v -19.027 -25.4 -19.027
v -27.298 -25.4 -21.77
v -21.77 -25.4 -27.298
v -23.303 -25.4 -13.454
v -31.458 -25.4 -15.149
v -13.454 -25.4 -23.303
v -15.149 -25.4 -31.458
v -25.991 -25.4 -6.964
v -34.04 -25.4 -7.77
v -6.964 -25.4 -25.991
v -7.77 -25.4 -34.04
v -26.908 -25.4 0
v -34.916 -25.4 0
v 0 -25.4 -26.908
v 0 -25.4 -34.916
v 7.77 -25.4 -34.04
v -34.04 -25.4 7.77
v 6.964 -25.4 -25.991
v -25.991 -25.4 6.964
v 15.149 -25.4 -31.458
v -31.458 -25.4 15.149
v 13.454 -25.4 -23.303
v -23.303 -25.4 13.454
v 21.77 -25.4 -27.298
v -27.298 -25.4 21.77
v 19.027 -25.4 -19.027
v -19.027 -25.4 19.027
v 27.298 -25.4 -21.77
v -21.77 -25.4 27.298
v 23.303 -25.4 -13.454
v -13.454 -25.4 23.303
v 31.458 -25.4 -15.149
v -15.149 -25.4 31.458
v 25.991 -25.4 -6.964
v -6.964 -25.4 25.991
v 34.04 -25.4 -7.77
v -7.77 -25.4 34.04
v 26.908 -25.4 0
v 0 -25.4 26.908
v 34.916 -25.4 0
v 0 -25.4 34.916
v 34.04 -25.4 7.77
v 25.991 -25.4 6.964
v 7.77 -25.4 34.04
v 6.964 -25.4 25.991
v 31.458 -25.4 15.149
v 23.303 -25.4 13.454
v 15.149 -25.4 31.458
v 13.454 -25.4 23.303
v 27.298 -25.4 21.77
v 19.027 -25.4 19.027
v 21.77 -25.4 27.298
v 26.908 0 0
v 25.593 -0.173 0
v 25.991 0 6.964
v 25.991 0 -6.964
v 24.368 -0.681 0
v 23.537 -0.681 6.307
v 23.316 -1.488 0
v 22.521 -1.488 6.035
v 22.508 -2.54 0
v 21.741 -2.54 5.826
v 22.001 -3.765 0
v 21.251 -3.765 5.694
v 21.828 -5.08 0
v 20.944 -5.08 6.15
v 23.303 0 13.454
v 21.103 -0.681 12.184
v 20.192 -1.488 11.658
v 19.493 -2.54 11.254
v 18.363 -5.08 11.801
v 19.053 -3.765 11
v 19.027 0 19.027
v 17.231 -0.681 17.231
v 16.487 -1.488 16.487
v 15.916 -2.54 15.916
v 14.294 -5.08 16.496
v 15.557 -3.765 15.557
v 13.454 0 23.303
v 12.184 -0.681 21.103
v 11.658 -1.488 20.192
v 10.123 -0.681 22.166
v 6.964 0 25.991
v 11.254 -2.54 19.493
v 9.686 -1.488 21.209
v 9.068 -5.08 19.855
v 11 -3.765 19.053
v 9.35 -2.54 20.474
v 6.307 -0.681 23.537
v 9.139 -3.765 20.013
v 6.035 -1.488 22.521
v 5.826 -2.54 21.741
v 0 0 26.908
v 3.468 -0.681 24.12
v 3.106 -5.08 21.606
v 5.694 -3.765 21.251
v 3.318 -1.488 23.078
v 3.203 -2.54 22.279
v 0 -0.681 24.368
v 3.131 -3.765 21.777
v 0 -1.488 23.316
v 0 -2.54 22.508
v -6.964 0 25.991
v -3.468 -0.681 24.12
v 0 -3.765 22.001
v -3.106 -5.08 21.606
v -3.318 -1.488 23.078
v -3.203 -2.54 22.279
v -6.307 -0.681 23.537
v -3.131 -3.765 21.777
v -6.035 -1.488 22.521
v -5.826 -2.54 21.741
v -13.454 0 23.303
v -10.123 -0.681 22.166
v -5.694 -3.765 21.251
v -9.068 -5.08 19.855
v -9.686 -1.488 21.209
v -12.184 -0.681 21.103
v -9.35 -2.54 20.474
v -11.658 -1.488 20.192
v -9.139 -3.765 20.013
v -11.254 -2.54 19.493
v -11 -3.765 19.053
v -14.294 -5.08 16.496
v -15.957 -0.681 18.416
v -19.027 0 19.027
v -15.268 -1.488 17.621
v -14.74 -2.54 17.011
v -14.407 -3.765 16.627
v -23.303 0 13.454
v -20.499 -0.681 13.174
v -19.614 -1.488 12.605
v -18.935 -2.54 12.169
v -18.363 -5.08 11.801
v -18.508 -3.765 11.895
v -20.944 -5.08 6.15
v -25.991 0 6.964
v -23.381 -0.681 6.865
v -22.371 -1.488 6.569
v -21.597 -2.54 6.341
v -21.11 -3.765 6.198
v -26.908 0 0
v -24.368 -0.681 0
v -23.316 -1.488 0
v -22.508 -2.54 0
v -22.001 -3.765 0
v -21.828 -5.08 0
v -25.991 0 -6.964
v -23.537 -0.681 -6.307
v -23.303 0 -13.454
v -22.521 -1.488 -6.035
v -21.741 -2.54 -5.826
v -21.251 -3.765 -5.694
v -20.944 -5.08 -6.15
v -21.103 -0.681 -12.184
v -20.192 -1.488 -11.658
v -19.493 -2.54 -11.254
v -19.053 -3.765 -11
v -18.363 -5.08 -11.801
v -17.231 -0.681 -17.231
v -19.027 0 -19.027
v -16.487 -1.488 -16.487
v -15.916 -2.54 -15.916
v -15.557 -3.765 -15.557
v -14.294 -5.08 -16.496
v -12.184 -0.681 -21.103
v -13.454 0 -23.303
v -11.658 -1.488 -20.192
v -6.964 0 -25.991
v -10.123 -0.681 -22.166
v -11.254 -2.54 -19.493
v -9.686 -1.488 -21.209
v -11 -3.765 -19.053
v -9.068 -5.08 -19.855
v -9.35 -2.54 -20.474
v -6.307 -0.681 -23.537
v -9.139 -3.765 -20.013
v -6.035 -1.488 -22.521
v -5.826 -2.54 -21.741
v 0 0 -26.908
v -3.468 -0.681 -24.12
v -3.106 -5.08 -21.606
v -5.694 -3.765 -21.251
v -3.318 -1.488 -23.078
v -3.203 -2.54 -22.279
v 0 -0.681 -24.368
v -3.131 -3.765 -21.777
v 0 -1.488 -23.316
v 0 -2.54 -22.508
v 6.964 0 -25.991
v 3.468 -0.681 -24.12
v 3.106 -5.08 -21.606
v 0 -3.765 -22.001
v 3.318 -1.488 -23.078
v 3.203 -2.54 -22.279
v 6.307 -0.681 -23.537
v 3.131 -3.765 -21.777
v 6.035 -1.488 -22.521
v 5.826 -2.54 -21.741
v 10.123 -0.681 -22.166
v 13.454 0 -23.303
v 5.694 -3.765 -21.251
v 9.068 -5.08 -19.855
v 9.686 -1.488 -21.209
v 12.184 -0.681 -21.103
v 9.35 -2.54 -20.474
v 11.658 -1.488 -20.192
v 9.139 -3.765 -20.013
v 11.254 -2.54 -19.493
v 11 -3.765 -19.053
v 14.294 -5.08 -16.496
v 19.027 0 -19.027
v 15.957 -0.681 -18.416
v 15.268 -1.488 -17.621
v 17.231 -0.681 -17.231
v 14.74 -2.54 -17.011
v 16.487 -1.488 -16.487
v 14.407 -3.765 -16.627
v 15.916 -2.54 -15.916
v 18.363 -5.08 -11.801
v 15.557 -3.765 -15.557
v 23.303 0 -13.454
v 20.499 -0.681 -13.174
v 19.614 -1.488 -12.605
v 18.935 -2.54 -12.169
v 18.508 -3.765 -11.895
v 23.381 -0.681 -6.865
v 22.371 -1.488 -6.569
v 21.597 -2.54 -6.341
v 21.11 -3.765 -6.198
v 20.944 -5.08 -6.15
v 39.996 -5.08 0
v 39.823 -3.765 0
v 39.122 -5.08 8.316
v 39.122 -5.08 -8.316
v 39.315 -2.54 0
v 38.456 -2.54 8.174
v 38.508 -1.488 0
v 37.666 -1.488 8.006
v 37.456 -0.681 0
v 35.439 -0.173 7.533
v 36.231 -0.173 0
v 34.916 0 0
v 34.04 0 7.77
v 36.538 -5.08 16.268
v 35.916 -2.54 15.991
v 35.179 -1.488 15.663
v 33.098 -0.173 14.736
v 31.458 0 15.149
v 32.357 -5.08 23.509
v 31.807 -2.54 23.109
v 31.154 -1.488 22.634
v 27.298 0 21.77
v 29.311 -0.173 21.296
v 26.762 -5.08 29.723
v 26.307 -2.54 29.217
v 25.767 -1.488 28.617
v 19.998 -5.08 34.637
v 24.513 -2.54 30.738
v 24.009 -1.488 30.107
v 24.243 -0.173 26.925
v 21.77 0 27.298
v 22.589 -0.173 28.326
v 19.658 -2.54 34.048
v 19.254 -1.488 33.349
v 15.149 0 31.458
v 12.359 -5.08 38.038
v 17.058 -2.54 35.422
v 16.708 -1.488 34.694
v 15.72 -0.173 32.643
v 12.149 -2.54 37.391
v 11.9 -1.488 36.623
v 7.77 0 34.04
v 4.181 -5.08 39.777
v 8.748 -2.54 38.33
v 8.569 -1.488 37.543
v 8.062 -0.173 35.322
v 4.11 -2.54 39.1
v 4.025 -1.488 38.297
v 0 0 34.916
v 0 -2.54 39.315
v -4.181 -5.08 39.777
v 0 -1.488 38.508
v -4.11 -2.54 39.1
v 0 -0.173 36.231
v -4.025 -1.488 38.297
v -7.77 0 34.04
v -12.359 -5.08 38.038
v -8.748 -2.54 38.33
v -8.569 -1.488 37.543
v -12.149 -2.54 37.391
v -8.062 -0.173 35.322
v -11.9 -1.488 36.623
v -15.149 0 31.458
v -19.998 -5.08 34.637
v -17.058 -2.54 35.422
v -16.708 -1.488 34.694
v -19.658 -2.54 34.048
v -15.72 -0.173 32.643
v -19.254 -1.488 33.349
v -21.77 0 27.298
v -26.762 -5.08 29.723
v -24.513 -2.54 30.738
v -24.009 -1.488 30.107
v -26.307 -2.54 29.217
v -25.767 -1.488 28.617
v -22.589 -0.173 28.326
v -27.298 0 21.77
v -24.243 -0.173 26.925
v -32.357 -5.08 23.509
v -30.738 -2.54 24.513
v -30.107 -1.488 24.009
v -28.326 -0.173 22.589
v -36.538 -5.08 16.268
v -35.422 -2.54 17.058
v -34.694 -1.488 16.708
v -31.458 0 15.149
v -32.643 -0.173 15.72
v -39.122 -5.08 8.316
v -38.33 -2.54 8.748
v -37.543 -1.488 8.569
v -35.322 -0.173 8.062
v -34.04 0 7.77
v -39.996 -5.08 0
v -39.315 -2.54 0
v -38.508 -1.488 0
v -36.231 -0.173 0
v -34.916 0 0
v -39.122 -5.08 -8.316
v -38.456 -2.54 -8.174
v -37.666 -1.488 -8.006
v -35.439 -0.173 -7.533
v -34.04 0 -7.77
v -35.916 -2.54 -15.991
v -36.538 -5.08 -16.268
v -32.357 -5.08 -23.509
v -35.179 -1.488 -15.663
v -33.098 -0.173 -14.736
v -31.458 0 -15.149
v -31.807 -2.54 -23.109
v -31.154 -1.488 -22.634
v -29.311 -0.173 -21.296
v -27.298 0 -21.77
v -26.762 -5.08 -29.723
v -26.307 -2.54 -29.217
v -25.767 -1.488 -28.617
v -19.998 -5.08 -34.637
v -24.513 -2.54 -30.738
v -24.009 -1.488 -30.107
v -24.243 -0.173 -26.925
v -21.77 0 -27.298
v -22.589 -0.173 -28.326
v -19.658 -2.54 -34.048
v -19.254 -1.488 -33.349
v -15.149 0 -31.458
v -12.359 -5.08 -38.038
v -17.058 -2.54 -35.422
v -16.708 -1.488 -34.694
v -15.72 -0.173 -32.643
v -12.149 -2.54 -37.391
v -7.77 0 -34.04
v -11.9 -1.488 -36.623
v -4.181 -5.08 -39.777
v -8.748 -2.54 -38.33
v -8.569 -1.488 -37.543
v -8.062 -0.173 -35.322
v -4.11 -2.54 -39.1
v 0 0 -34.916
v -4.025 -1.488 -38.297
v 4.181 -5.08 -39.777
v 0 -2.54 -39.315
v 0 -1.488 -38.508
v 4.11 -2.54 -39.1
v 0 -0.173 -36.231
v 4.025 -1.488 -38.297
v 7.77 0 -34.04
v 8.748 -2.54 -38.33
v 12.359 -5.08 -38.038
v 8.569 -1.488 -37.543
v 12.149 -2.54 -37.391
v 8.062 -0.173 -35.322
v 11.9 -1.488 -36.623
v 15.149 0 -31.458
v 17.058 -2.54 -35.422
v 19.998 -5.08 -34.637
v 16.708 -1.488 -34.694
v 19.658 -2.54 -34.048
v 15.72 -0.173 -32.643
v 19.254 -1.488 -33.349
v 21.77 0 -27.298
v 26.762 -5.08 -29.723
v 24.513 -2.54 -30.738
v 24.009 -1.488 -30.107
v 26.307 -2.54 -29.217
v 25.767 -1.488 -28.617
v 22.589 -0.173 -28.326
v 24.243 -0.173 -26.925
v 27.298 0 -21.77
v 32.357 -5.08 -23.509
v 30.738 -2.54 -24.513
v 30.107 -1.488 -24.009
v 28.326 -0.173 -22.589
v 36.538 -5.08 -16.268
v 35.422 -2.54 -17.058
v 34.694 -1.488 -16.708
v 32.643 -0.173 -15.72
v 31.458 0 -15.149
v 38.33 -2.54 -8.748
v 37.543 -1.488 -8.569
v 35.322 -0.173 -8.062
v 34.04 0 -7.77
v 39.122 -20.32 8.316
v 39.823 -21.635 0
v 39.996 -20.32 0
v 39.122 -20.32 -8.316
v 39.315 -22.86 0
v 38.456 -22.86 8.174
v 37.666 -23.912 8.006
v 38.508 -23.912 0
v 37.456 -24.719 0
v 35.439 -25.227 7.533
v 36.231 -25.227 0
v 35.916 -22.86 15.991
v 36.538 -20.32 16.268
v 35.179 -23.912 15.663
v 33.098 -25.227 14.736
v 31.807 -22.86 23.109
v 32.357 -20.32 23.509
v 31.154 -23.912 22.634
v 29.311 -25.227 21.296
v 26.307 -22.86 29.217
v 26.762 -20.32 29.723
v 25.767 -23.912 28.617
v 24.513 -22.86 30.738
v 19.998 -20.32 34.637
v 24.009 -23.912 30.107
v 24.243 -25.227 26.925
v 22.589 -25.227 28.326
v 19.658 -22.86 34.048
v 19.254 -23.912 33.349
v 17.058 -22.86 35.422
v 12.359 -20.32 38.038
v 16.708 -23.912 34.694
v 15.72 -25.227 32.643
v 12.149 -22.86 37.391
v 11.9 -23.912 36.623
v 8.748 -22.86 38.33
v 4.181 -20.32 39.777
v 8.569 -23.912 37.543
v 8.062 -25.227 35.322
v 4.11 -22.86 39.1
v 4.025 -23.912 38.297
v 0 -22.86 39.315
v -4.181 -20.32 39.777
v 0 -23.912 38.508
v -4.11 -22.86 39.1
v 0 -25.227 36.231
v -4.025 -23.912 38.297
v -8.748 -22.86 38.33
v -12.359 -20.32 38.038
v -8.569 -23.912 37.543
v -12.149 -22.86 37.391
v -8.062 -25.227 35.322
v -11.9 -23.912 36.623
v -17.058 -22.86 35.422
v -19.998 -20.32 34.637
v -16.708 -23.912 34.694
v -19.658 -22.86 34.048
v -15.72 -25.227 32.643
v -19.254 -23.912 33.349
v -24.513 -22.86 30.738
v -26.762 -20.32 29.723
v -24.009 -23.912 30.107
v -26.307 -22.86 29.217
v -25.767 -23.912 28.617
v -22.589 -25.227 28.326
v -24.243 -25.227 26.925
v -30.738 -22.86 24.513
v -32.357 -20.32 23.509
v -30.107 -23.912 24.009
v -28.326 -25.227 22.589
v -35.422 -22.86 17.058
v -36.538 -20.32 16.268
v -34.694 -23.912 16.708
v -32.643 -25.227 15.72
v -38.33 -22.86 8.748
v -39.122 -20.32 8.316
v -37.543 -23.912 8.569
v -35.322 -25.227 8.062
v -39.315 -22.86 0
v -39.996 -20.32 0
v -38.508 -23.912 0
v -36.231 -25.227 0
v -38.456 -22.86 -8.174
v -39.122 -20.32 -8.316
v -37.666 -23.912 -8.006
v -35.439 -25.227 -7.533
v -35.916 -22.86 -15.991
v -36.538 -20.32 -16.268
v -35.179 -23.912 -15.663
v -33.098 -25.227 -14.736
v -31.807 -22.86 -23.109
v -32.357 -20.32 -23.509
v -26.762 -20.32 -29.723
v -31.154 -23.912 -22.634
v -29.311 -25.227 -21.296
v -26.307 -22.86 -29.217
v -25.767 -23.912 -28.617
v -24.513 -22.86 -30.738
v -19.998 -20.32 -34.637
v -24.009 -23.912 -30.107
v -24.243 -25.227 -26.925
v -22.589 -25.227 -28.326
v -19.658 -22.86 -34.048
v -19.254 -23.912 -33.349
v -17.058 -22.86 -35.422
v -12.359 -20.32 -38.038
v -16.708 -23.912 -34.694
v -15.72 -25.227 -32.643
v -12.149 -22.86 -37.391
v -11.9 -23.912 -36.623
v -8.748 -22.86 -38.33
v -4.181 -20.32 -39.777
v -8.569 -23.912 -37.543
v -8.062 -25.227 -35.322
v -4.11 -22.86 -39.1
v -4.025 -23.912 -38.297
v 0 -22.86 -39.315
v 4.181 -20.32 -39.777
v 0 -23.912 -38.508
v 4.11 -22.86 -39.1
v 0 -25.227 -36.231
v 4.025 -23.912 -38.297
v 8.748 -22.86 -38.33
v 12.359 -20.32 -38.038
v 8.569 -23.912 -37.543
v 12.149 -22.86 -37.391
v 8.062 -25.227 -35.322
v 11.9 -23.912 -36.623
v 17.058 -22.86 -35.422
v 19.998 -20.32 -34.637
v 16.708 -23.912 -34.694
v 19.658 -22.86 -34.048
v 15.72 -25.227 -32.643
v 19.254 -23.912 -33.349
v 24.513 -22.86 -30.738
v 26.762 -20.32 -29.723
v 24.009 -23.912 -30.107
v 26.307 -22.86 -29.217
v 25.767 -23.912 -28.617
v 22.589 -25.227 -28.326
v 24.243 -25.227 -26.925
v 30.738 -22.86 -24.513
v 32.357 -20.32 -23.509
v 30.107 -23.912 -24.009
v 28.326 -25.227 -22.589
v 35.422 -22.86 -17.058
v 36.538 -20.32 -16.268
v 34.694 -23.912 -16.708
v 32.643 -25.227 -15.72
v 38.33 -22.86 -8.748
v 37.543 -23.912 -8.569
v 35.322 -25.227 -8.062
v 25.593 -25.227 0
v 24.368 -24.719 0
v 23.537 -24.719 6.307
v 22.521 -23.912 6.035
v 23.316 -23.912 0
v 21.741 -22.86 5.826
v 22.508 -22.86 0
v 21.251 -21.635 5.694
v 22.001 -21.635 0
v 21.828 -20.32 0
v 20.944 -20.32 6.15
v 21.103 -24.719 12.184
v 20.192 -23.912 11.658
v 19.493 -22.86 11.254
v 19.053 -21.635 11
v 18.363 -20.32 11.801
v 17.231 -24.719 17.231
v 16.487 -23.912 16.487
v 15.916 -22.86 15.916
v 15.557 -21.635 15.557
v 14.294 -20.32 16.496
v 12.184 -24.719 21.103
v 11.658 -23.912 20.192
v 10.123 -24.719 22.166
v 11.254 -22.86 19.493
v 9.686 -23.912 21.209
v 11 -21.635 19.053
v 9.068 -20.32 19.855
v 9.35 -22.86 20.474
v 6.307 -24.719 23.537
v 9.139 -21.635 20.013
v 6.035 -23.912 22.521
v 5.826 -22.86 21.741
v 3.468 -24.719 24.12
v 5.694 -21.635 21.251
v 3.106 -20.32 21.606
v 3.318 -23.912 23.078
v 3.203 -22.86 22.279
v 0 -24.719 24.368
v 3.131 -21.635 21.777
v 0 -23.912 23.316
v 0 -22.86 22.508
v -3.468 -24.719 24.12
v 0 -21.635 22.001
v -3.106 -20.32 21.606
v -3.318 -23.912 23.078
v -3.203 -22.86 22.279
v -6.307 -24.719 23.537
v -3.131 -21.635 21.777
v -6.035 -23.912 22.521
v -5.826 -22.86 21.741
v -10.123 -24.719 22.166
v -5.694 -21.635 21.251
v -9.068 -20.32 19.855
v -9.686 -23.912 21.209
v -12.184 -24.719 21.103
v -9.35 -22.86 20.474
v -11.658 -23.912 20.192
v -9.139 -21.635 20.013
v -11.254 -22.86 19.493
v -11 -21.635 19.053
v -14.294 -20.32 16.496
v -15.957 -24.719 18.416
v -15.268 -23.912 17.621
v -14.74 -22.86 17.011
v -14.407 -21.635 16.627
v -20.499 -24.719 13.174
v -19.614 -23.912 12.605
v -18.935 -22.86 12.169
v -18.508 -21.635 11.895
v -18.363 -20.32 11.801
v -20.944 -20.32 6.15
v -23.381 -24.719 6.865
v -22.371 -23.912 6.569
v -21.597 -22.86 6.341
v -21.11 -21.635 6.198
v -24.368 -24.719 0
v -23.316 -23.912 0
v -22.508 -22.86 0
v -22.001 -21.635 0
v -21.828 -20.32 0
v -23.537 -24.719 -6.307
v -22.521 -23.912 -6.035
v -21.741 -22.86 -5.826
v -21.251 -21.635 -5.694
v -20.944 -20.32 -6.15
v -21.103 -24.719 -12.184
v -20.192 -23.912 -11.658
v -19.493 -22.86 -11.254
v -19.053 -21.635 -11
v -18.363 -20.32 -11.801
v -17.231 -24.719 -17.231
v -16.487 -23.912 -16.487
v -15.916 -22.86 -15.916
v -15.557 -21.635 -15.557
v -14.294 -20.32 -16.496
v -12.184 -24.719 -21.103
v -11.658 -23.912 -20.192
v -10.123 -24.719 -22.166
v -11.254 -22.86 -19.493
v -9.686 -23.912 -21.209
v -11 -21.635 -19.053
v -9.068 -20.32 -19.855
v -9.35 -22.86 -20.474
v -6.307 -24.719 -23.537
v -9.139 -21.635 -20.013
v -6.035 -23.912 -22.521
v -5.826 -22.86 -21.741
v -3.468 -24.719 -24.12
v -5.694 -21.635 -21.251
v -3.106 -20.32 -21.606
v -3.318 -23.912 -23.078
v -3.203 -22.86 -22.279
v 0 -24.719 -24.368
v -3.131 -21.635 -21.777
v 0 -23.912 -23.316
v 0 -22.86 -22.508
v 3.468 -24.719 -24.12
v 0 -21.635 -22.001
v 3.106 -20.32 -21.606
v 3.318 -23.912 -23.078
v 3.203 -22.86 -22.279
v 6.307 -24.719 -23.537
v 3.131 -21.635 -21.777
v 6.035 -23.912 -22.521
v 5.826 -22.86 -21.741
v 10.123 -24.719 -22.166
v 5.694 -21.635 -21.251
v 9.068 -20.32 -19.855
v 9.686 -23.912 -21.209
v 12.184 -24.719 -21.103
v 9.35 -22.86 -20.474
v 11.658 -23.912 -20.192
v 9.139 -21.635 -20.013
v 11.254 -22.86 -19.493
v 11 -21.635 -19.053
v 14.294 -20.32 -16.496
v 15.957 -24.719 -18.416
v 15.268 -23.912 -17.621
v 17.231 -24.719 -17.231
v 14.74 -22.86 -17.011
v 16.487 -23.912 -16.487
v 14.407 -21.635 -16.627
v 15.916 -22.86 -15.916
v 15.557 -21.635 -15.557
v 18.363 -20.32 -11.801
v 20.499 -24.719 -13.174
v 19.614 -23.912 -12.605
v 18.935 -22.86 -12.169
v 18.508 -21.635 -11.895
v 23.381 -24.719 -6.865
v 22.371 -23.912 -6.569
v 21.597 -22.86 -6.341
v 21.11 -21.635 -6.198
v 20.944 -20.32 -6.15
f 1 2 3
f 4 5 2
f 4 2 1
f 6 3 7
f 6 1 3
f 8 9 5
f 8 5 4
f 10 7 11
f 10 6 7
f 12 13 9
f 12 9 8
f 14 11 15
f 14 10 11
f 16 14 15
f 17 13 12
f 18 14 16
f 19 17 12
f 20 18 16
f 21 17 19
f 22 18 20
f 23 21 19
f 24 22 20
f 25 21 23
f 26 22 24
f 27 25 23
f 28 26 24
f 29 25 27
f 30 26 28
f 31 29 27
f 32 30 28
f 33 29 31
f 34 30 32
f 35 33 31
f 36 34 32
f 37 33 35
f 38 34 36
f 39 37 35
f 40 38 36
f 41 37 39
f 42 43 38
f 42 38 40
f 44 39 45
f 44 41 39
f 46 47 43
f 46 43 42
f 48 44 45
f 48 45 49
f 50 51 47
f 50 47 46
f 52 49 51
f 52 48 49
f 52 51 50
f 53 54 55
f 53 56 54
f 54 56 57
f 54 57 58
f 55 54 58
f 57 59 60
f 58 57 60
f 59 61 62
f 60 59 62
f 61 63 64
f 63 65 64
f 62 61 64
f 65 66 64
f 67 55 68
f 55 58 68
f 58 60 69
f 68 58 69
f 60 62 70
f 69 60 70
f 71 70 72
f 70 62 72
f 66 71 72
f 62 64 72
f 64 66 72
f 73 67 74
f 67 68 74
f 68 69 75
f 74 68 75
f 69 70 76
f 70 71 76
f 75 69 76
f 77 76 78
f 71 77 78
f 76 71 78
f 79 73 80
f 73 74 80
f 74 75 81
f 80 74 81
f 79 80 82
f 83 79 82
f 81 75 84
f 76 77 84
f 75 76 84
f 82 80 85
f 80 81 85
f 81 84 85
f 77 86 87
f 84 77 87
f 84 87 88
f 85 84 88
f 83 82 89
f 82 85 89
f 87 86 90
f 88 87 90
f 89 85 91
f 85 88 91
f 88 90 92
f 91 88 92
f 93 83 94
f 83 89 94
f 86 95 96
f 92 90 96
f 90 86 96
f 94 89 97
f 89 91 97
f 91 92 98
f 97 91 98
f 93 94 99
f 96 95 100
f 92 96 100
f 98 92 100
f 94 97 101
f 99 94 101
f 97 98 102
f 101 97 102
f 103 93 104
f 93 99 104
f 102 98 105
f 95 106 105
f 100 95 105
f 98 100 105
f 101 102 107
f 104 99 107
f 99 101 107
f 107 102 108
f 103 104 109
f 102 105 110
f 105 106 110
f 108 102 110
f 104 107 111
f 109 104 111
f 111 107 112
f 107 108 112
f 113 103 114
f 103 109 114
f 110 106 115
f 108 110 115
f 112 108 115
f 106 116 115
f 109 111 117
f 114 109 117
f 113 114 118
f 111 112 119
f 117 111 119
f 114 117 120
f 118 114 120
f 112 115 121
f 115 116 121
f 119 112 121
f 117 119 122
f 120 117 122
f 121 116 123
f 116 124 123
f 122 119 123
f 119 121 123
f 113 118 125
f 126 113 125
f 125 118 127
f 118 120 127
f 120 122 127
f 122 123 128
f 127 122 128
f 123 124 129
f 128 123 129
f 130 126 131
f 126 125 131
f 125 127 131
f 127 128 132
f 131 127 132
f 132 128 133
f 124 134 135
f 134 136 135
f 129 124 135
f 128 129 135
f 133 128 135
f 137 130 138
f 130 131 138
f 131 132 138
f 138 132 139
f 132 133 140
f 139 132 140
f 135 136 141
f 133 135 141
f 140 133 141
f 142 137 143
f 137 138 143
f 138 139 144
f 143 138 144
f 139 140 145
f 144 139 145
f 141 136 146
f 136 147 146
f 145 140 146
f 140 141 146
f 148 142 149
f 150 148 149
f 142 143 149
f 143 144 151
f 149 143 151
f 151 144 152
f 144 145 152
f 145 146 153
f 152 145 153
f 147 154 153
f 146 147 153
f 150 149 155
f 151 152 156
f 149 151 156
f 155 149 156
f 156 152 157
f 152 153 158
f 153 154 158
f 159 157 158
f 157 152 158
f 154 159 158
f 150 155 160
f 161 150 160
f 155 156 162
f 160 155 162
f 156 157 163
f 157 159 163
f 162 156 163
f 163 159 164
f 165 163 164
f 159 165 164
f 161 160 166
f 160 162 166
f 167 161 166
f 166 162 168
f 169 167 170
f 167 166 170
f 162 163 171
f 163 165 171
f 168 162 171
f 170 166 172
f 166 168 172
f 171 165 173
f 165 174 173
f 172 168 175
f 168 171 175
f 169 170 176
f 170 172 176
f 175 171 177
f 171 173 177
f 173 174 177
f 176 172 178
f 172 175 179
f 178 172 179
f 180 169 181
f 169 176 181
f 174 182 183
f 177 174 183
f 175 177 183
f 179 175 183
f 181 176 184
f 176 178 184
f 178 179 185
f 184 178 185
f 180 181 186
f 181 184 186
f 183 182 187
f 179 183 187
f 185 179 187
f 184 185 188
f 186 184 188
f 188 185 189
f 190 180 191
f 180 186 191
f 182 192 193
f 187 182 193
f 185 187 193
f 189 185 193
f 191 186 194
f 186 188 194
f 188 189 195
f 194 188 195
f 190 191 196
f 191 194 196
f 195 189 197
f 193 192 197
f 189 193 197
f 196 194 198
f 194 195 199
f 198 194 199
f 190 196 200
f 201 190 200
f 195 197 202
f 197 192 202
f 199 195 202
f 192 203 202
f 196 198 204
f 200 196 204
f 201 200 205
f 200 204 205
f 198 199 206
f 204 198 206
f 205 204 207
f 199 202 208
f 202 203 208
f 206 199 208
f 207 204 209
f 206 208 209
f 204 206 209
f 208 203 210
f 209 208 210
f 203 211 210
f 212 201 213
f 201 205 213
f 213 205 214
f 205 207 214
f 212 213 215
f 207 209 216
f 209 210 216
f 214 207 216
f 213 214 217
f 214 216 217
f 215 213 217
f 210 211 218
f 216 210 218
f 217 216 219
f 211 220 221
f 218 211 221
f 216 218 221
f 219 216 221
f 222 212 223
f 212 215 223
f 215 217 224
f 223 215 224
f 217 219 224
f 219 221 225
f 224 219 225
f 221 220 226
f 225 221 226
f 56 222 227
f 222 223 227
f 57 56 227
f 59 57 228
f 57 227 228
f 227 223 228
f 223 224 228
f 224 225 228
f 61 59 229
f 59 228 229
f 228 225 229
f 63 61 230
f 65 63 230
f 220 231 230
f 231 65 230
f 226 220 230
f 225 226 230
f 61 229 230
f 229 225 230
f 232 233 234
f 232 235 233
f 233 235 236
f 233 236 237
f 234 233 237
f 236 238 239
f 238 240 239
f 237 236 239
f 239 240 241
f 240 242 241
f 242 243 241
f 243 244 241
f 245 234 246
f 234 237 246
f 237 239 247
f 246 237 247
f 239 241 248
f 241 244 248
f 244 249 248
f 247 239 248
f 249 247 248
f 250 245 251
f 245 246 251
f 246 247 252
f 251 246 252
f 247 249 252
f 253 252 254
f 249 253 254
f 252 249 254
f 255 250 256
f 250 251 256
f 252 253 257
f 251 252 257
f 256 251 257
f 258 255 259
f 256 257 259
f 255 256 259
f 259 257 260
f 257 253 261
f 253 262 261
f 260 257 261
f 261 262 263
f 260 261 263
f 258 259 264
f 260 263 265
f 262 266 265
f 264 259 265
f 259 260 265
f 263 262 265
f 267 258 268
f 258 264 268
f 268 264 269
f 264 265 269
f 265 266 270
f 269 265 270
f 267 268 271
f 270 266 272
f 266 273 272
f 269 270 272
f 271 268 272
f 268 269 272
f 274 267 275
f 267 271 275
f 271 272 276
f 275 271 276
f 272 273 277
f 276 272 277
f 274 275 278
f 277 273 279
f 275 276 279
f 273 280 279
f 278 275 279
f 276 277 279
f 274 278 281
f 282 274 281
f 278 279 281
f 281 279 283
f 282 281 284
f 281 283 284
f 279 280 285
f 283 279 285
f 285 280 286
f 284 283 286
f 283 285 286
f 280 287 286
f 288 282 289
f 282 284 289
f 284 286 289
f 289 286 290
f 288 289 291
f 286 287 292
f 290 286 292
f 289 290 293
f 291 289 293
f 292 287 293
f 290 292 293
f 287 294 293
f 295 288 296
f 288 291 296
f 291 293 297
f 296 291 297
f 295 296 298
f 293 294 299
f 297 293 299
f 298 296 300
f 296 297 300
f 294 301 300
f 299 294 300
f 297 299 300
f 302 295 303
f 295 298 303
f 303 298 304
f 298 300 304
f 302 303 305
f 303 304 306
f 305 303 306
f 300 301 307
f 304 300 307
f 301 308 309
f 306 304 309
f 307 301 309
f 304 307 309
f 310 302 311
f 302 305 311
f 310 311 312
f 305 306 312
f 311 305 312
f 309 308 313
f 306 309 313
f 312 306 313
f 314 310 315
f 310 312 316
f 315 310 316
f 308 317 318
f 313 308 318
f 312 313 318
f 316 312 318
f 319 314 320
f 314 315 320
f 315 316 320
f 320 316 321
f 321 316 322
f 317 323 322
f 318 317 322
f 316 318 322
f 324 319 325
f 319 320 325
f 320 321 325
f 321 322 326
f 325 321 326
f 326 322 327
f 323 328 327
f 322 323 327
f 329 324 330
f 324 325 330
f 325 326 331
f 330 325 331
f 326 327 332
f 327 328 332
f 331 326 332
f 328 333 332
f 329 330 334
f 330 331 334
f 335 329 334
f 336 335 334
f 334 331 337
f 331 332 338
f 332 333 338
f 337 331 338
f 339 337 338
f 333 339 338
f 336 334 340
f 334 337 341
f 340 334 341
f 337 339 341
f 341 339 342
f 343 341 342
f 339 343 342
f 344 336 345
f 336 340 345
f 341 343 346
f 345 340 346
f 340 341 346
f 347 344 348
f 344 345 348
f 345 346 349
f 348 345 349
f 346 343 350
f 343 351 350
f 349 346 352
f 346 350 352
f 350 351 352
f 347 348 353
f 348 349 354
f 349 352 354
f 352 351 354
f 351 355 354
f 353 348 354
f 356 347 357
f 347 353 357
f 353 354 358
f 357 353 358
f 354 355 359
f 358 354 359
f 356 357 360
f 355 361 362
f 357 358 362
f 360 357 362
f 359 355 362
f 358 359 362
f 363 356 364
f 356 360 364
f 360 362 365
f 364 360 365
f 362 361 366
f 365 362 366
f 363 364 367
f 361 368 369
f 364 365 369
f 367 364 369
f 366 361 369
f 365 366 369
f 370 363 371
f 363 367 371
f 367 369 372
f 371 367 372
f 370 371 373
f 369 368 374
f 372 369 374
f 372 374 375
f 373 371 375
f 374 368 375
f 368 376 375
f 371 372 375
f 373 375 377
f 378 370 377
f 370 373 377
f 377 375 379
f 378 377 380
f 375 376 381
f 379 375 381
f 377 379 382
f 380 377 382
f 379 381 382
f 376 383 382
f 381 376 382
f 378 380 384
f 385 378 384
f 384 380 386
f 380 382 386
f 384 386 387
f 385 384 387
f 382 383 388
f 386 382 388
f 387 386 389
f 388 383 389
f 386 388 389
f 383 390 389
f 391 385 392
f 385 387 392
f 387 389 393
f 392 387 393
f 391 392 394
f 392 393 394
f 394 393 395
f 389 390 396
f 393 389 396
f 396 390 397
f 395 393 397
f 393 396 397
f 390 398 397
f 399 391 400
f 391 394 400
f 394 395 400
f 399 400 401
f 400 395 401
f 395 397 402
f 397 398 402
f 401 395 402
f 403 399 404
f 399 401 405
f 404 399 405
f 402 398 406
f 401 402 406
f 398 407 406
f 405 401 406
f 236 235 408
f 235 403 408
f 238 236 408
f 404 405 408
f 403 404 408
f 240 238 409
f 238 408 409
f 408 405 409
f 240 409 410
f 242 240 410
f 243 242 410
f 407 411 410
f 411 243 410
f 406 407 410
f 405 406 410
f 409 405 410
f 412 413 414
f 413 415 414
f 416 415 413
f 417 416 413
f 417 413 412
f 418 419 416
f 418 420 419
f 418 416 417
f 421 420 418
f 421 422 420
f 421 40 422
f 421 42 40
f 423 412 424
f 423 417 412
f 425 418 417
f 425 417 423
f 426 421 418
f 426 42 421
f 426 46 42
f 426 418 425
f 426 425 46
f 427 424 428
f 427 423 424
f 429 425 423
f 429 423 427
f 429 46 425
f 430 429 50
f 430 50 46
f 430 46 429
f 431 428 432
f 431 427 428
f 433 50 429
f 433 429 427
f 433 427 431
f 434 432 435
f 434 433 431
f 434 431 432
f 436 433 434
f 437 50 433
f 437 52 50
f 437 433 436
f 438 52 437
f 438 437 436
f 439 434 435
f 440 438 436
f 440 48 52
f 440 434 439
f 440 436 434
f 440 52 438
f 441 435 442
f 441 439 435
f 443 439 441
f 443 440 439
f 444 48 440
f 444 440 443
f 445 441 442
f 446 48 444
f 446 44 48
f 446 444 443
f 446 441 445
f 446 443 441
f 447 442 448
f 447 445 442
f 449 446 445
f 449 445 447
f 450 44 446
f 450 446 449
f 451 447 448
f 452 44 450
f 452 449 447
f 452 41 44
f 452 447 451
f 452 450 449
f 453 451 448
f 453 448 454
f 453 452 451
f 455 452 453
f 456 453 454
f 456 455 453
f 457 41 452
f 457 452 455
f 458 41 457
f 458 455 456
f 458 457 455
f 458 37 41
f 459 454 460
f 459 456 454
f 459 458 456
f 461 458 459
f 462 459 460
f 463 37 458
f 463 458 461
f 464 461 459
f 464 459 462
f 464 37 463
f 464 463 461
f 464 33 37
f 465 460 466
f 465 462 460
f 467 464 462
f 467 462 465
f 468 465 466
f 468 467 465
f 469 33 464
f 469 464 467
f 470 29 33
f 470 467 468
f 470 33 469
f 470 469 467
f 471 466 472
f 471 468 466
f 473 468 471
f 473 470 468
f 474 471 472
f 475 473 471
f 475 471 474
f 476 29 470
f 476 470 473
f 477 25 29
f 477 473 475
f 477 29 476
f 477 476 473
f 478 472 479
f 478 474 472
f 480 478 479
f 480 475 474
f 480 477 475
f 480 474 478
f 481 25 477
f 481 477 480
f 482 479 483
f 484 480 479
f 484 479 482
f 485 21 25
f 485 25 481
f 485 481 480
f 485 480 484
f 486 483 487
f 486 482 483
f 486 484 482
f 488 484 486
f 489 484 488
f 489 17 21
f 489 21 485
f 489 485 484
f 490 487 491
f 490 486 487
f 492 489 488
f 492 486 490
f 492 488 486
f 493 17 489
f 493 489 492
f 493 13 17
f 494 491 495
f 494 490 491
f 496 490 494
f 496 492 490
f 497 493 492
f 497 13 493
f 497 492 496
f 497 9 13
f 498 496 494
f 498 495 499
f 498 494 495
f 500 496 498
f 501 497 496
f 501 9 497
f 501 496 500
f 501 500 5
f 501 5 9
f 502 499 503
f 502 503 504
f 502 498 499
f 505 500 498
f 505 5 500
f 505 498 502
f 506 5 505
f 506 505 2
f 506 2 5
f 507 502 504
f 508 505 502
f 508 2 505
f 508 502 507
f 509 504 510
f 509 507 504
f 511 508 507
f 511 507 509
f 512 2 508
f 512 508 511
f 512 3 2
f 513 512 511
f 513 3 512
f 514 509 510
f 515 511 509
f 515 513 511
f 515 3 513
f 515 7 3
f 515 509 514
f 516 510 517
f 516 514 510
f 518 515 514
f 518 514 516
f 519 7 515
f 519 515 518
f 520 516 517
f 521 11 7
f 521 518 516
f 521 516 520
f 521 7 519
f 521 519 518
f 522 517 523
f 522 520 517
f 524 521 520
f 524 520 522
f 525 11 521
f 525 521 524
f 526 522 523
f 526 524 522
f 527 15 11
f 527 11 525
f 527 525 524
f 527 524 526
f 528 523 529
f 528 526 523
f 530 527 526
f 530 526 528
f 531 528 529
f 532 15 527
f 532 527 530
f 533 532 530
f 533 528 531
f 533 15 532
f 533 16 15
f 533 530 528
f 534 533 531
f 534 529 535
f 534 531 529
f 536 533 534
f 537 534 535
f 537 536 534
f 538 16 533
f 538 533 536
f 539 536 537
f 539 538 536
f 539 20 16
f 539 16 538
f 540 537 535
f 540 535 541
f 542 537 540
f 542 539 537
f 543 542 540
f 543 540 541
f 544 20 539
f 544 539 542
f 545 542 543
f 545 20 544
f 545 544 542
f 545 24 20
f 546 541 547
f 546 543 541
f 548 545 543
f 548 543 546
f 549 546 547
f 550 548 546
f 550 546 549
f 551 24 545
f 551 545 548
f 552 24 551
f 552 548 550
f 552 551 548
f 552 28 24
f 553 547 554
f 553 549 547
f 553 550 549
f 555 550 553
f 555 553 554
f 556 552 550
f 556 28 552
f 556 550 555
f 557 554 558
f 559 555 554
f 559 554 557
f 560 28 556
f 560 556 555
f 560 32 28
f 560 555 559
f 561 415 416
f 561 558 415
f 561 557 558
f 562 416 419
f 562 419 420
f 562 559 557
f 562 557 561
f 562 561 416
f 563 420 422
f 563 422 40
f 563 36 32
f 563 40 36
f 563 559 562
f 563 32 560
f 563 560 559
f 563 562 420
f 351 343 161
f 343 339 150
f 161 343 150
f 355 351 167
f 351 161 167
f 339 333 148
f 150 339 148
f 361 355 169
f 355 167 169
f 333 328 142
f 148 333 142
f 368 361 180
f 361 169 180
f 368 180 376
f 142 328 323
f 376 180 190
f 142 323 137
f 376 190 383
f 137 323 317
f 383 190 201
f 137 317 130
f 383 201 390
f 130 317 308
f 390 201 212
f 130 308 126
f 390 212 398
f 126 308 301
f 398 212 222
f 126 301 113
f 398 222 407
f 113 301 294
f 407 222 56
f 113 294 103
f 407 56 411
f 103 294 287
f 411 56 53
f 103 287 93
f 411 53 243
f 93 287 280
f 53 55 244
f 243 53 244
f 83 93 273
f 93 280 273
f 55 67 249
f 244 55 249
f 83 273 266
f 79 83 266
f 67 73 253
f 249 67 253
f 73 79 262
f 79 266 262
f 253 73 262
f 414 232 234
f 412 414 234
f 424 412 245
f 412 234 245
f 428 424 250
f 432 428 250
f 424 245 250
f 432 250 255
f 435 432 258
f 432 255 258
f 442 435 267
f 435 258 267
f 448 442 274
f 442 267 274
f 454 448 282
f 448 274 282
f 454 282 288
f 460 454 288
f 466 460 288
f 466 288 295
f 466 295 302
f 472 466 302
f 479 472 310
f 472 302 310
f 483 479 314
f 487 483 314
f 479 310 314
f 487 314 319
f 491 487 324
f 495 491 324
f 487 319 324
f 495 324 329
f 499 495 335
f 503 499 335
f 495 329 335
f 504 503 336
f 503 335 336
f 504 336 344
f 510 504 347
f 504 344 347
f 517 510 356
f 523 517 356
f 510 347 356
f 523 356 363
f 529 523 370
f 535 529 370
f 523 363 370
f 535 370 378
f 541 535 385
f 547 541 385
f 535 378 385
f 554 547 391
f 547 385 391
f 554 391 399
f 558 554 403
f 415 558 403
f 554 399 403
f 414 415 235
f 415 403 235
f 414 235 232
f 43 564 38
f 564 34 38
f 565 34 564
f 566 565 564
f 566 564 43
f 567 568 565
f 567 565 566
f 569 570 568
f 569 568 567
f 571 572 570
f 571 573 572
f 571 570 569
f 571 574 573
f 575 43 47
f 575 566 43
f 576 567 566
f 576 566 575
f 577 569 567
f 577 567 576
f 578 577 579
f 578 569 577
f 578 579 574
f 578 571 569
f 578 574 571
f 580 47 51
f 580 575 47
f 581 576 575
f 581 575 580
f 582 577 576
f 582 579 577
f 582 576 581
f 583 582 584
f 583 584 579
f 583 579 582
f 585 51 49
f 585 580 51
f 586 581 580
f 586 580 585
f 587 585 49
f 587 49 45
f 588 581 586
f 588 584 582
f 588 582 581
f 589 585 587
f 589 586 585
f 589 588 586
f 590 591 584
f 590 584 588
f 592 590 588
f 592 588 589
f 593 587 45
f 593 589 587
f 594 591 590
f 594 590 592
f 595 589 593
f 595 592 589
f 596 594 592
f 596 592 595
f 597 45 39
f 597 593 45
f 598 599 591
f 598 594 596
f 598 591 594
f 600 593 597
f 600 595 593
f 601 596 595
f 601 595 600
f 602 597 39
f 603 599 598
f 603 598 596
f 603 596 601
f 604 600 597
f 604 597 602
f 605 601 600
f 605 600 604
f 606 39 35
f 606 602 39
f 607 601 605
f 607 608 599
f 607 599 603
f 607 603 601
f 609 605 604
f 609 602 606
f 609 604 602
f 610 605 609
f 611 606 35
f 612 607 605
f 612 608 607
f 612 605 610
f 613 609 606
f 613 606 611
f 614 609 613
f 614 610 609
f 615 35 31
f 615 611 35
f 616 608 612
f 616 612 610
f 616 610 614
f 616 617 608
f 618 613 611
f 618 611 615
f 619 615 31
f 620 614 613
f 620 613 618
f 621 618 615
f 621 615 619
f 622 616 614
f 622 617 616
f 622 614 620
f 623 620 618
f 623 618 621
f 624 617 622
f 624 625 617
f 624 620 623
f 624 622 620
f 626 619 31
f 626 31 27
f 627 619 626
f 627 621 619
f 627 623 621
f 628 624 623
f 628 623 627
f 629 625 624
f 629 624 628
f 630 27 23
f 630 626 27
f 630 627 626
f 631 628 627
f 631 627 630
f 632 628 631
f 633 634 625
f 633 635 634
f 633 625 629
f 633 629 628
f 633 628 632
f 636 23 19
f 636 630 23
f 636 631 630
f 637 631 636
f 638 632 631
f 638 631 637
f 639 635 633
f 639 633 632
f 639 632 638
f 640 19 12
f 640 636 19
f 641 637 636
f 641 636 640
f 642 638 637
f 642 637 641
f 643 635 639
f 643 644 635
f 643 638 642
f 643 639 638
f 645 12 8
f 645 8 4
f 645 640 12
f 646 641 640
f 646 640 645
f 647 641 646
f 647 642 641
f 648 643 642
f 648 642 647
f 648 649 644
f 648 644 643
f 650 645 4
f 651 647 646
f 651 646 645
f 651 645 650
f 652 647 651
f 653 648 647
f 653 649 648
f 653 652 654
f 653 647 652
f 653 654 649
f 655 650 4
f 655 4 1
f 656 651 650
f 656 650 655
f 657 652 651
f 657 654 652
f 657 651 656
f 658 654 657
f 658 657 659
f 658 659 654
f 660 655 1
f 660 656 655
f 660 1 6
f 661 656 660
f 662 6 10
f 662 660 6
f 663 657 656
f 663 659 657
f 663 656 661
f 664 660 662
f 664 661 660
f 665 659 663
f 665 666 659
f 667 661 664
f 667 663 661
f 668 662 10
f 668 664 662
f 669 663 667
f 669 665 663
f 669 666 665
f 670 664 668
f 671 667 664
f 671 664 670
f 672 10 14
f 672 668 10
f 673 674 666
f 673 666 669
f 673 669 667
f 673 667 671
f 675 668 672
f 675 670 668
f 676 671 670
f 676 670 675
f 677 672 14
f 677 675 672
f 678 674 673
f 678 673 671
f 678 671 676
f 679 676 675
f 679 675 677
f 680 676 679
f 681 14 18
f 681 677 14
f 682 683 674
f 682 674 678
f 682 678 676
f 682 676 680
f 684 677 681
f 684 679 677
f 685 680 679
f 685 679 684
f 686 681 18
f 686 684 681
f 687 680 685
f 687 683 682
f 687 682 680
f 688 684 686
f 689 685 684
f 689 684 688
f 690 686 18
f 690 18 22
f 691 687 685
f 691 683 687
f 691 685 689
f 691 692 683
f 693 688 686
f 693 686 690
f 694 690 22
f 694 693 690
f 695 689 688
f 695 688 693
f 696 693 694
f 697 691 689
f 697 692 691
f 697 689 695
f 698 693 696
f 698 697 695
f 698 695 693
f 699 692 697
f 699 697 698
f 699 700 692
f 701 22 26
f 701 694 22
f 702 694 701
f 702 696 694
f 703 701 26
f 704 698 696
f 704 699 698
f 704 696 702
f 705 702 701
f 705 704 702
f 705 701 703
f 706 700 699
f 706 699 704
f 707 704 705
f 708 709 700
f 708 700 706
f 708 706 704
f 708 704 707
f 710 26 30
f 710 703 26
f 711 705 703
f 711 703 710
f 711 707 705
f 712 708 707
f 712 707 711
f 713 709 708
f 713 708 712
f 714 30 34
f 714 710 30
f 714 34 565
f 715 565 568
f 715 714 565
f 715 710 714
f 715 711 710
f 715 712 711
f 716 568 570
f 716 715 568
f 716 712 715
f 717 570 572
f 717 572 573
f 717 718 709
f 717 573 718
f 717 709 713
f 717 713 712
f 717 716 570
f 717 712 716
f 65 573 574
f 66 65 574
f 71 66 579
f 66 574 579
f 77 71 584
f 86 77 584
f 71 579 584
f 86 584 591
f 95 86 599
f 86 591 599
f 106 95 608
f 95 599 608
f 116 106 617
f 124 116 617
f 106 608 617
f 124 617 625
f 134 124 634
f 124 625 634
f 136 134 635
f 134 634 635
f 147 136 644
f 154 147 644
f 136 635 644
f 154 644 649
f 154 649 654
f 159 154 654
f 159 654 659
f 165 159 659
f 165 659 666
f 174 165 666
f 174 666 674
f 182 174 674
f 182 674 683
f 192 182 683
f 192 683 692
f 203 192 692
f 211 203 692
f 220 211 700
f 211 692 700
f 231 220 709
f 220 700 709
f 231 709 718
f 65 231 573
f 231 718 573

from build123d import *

# Parameters (mm, degrees)
F0_R     = 39.9958807844
F1_DEPTH = 25.4
F2_R     = 21.8277416201
F3_DEPTH = 25.4
F4_R     = 5.08
F5_R     = 5.08


with BuildPart() as f1:
    # F0 (on Front) → F1 (new body)
    with BuildSketch(Plane.XZ):
        Circle(F0_R)
    extrude(amount=F1_DEPTH)

    # F2 (on face) → F3 (cut)
    with BuildSketch(Plane.XZ.offset(25.4)):
        Circle(F2_R)
    extrude(amount=-F3_DEPTH, mode=Mode.SUBTRACT)

    # F4
    f4_edges = [f1.edges().sort_by_distance(p)[0] for p in [
        (-39.995881, -25.4, 0),
        (-21.827742, -25.4, 0),
    ]]
    fillet(f4_edges, radius=F4_R)

    # F5
    f5_edges = [f1.edges().sort_by_distance(p)[0] for p in [
        (-39.995881, 0, 0),
        (-21.827742, 0, 0),
    ]]
    fillet(f5_edges, radius=F5_R)


solid = f1.part
